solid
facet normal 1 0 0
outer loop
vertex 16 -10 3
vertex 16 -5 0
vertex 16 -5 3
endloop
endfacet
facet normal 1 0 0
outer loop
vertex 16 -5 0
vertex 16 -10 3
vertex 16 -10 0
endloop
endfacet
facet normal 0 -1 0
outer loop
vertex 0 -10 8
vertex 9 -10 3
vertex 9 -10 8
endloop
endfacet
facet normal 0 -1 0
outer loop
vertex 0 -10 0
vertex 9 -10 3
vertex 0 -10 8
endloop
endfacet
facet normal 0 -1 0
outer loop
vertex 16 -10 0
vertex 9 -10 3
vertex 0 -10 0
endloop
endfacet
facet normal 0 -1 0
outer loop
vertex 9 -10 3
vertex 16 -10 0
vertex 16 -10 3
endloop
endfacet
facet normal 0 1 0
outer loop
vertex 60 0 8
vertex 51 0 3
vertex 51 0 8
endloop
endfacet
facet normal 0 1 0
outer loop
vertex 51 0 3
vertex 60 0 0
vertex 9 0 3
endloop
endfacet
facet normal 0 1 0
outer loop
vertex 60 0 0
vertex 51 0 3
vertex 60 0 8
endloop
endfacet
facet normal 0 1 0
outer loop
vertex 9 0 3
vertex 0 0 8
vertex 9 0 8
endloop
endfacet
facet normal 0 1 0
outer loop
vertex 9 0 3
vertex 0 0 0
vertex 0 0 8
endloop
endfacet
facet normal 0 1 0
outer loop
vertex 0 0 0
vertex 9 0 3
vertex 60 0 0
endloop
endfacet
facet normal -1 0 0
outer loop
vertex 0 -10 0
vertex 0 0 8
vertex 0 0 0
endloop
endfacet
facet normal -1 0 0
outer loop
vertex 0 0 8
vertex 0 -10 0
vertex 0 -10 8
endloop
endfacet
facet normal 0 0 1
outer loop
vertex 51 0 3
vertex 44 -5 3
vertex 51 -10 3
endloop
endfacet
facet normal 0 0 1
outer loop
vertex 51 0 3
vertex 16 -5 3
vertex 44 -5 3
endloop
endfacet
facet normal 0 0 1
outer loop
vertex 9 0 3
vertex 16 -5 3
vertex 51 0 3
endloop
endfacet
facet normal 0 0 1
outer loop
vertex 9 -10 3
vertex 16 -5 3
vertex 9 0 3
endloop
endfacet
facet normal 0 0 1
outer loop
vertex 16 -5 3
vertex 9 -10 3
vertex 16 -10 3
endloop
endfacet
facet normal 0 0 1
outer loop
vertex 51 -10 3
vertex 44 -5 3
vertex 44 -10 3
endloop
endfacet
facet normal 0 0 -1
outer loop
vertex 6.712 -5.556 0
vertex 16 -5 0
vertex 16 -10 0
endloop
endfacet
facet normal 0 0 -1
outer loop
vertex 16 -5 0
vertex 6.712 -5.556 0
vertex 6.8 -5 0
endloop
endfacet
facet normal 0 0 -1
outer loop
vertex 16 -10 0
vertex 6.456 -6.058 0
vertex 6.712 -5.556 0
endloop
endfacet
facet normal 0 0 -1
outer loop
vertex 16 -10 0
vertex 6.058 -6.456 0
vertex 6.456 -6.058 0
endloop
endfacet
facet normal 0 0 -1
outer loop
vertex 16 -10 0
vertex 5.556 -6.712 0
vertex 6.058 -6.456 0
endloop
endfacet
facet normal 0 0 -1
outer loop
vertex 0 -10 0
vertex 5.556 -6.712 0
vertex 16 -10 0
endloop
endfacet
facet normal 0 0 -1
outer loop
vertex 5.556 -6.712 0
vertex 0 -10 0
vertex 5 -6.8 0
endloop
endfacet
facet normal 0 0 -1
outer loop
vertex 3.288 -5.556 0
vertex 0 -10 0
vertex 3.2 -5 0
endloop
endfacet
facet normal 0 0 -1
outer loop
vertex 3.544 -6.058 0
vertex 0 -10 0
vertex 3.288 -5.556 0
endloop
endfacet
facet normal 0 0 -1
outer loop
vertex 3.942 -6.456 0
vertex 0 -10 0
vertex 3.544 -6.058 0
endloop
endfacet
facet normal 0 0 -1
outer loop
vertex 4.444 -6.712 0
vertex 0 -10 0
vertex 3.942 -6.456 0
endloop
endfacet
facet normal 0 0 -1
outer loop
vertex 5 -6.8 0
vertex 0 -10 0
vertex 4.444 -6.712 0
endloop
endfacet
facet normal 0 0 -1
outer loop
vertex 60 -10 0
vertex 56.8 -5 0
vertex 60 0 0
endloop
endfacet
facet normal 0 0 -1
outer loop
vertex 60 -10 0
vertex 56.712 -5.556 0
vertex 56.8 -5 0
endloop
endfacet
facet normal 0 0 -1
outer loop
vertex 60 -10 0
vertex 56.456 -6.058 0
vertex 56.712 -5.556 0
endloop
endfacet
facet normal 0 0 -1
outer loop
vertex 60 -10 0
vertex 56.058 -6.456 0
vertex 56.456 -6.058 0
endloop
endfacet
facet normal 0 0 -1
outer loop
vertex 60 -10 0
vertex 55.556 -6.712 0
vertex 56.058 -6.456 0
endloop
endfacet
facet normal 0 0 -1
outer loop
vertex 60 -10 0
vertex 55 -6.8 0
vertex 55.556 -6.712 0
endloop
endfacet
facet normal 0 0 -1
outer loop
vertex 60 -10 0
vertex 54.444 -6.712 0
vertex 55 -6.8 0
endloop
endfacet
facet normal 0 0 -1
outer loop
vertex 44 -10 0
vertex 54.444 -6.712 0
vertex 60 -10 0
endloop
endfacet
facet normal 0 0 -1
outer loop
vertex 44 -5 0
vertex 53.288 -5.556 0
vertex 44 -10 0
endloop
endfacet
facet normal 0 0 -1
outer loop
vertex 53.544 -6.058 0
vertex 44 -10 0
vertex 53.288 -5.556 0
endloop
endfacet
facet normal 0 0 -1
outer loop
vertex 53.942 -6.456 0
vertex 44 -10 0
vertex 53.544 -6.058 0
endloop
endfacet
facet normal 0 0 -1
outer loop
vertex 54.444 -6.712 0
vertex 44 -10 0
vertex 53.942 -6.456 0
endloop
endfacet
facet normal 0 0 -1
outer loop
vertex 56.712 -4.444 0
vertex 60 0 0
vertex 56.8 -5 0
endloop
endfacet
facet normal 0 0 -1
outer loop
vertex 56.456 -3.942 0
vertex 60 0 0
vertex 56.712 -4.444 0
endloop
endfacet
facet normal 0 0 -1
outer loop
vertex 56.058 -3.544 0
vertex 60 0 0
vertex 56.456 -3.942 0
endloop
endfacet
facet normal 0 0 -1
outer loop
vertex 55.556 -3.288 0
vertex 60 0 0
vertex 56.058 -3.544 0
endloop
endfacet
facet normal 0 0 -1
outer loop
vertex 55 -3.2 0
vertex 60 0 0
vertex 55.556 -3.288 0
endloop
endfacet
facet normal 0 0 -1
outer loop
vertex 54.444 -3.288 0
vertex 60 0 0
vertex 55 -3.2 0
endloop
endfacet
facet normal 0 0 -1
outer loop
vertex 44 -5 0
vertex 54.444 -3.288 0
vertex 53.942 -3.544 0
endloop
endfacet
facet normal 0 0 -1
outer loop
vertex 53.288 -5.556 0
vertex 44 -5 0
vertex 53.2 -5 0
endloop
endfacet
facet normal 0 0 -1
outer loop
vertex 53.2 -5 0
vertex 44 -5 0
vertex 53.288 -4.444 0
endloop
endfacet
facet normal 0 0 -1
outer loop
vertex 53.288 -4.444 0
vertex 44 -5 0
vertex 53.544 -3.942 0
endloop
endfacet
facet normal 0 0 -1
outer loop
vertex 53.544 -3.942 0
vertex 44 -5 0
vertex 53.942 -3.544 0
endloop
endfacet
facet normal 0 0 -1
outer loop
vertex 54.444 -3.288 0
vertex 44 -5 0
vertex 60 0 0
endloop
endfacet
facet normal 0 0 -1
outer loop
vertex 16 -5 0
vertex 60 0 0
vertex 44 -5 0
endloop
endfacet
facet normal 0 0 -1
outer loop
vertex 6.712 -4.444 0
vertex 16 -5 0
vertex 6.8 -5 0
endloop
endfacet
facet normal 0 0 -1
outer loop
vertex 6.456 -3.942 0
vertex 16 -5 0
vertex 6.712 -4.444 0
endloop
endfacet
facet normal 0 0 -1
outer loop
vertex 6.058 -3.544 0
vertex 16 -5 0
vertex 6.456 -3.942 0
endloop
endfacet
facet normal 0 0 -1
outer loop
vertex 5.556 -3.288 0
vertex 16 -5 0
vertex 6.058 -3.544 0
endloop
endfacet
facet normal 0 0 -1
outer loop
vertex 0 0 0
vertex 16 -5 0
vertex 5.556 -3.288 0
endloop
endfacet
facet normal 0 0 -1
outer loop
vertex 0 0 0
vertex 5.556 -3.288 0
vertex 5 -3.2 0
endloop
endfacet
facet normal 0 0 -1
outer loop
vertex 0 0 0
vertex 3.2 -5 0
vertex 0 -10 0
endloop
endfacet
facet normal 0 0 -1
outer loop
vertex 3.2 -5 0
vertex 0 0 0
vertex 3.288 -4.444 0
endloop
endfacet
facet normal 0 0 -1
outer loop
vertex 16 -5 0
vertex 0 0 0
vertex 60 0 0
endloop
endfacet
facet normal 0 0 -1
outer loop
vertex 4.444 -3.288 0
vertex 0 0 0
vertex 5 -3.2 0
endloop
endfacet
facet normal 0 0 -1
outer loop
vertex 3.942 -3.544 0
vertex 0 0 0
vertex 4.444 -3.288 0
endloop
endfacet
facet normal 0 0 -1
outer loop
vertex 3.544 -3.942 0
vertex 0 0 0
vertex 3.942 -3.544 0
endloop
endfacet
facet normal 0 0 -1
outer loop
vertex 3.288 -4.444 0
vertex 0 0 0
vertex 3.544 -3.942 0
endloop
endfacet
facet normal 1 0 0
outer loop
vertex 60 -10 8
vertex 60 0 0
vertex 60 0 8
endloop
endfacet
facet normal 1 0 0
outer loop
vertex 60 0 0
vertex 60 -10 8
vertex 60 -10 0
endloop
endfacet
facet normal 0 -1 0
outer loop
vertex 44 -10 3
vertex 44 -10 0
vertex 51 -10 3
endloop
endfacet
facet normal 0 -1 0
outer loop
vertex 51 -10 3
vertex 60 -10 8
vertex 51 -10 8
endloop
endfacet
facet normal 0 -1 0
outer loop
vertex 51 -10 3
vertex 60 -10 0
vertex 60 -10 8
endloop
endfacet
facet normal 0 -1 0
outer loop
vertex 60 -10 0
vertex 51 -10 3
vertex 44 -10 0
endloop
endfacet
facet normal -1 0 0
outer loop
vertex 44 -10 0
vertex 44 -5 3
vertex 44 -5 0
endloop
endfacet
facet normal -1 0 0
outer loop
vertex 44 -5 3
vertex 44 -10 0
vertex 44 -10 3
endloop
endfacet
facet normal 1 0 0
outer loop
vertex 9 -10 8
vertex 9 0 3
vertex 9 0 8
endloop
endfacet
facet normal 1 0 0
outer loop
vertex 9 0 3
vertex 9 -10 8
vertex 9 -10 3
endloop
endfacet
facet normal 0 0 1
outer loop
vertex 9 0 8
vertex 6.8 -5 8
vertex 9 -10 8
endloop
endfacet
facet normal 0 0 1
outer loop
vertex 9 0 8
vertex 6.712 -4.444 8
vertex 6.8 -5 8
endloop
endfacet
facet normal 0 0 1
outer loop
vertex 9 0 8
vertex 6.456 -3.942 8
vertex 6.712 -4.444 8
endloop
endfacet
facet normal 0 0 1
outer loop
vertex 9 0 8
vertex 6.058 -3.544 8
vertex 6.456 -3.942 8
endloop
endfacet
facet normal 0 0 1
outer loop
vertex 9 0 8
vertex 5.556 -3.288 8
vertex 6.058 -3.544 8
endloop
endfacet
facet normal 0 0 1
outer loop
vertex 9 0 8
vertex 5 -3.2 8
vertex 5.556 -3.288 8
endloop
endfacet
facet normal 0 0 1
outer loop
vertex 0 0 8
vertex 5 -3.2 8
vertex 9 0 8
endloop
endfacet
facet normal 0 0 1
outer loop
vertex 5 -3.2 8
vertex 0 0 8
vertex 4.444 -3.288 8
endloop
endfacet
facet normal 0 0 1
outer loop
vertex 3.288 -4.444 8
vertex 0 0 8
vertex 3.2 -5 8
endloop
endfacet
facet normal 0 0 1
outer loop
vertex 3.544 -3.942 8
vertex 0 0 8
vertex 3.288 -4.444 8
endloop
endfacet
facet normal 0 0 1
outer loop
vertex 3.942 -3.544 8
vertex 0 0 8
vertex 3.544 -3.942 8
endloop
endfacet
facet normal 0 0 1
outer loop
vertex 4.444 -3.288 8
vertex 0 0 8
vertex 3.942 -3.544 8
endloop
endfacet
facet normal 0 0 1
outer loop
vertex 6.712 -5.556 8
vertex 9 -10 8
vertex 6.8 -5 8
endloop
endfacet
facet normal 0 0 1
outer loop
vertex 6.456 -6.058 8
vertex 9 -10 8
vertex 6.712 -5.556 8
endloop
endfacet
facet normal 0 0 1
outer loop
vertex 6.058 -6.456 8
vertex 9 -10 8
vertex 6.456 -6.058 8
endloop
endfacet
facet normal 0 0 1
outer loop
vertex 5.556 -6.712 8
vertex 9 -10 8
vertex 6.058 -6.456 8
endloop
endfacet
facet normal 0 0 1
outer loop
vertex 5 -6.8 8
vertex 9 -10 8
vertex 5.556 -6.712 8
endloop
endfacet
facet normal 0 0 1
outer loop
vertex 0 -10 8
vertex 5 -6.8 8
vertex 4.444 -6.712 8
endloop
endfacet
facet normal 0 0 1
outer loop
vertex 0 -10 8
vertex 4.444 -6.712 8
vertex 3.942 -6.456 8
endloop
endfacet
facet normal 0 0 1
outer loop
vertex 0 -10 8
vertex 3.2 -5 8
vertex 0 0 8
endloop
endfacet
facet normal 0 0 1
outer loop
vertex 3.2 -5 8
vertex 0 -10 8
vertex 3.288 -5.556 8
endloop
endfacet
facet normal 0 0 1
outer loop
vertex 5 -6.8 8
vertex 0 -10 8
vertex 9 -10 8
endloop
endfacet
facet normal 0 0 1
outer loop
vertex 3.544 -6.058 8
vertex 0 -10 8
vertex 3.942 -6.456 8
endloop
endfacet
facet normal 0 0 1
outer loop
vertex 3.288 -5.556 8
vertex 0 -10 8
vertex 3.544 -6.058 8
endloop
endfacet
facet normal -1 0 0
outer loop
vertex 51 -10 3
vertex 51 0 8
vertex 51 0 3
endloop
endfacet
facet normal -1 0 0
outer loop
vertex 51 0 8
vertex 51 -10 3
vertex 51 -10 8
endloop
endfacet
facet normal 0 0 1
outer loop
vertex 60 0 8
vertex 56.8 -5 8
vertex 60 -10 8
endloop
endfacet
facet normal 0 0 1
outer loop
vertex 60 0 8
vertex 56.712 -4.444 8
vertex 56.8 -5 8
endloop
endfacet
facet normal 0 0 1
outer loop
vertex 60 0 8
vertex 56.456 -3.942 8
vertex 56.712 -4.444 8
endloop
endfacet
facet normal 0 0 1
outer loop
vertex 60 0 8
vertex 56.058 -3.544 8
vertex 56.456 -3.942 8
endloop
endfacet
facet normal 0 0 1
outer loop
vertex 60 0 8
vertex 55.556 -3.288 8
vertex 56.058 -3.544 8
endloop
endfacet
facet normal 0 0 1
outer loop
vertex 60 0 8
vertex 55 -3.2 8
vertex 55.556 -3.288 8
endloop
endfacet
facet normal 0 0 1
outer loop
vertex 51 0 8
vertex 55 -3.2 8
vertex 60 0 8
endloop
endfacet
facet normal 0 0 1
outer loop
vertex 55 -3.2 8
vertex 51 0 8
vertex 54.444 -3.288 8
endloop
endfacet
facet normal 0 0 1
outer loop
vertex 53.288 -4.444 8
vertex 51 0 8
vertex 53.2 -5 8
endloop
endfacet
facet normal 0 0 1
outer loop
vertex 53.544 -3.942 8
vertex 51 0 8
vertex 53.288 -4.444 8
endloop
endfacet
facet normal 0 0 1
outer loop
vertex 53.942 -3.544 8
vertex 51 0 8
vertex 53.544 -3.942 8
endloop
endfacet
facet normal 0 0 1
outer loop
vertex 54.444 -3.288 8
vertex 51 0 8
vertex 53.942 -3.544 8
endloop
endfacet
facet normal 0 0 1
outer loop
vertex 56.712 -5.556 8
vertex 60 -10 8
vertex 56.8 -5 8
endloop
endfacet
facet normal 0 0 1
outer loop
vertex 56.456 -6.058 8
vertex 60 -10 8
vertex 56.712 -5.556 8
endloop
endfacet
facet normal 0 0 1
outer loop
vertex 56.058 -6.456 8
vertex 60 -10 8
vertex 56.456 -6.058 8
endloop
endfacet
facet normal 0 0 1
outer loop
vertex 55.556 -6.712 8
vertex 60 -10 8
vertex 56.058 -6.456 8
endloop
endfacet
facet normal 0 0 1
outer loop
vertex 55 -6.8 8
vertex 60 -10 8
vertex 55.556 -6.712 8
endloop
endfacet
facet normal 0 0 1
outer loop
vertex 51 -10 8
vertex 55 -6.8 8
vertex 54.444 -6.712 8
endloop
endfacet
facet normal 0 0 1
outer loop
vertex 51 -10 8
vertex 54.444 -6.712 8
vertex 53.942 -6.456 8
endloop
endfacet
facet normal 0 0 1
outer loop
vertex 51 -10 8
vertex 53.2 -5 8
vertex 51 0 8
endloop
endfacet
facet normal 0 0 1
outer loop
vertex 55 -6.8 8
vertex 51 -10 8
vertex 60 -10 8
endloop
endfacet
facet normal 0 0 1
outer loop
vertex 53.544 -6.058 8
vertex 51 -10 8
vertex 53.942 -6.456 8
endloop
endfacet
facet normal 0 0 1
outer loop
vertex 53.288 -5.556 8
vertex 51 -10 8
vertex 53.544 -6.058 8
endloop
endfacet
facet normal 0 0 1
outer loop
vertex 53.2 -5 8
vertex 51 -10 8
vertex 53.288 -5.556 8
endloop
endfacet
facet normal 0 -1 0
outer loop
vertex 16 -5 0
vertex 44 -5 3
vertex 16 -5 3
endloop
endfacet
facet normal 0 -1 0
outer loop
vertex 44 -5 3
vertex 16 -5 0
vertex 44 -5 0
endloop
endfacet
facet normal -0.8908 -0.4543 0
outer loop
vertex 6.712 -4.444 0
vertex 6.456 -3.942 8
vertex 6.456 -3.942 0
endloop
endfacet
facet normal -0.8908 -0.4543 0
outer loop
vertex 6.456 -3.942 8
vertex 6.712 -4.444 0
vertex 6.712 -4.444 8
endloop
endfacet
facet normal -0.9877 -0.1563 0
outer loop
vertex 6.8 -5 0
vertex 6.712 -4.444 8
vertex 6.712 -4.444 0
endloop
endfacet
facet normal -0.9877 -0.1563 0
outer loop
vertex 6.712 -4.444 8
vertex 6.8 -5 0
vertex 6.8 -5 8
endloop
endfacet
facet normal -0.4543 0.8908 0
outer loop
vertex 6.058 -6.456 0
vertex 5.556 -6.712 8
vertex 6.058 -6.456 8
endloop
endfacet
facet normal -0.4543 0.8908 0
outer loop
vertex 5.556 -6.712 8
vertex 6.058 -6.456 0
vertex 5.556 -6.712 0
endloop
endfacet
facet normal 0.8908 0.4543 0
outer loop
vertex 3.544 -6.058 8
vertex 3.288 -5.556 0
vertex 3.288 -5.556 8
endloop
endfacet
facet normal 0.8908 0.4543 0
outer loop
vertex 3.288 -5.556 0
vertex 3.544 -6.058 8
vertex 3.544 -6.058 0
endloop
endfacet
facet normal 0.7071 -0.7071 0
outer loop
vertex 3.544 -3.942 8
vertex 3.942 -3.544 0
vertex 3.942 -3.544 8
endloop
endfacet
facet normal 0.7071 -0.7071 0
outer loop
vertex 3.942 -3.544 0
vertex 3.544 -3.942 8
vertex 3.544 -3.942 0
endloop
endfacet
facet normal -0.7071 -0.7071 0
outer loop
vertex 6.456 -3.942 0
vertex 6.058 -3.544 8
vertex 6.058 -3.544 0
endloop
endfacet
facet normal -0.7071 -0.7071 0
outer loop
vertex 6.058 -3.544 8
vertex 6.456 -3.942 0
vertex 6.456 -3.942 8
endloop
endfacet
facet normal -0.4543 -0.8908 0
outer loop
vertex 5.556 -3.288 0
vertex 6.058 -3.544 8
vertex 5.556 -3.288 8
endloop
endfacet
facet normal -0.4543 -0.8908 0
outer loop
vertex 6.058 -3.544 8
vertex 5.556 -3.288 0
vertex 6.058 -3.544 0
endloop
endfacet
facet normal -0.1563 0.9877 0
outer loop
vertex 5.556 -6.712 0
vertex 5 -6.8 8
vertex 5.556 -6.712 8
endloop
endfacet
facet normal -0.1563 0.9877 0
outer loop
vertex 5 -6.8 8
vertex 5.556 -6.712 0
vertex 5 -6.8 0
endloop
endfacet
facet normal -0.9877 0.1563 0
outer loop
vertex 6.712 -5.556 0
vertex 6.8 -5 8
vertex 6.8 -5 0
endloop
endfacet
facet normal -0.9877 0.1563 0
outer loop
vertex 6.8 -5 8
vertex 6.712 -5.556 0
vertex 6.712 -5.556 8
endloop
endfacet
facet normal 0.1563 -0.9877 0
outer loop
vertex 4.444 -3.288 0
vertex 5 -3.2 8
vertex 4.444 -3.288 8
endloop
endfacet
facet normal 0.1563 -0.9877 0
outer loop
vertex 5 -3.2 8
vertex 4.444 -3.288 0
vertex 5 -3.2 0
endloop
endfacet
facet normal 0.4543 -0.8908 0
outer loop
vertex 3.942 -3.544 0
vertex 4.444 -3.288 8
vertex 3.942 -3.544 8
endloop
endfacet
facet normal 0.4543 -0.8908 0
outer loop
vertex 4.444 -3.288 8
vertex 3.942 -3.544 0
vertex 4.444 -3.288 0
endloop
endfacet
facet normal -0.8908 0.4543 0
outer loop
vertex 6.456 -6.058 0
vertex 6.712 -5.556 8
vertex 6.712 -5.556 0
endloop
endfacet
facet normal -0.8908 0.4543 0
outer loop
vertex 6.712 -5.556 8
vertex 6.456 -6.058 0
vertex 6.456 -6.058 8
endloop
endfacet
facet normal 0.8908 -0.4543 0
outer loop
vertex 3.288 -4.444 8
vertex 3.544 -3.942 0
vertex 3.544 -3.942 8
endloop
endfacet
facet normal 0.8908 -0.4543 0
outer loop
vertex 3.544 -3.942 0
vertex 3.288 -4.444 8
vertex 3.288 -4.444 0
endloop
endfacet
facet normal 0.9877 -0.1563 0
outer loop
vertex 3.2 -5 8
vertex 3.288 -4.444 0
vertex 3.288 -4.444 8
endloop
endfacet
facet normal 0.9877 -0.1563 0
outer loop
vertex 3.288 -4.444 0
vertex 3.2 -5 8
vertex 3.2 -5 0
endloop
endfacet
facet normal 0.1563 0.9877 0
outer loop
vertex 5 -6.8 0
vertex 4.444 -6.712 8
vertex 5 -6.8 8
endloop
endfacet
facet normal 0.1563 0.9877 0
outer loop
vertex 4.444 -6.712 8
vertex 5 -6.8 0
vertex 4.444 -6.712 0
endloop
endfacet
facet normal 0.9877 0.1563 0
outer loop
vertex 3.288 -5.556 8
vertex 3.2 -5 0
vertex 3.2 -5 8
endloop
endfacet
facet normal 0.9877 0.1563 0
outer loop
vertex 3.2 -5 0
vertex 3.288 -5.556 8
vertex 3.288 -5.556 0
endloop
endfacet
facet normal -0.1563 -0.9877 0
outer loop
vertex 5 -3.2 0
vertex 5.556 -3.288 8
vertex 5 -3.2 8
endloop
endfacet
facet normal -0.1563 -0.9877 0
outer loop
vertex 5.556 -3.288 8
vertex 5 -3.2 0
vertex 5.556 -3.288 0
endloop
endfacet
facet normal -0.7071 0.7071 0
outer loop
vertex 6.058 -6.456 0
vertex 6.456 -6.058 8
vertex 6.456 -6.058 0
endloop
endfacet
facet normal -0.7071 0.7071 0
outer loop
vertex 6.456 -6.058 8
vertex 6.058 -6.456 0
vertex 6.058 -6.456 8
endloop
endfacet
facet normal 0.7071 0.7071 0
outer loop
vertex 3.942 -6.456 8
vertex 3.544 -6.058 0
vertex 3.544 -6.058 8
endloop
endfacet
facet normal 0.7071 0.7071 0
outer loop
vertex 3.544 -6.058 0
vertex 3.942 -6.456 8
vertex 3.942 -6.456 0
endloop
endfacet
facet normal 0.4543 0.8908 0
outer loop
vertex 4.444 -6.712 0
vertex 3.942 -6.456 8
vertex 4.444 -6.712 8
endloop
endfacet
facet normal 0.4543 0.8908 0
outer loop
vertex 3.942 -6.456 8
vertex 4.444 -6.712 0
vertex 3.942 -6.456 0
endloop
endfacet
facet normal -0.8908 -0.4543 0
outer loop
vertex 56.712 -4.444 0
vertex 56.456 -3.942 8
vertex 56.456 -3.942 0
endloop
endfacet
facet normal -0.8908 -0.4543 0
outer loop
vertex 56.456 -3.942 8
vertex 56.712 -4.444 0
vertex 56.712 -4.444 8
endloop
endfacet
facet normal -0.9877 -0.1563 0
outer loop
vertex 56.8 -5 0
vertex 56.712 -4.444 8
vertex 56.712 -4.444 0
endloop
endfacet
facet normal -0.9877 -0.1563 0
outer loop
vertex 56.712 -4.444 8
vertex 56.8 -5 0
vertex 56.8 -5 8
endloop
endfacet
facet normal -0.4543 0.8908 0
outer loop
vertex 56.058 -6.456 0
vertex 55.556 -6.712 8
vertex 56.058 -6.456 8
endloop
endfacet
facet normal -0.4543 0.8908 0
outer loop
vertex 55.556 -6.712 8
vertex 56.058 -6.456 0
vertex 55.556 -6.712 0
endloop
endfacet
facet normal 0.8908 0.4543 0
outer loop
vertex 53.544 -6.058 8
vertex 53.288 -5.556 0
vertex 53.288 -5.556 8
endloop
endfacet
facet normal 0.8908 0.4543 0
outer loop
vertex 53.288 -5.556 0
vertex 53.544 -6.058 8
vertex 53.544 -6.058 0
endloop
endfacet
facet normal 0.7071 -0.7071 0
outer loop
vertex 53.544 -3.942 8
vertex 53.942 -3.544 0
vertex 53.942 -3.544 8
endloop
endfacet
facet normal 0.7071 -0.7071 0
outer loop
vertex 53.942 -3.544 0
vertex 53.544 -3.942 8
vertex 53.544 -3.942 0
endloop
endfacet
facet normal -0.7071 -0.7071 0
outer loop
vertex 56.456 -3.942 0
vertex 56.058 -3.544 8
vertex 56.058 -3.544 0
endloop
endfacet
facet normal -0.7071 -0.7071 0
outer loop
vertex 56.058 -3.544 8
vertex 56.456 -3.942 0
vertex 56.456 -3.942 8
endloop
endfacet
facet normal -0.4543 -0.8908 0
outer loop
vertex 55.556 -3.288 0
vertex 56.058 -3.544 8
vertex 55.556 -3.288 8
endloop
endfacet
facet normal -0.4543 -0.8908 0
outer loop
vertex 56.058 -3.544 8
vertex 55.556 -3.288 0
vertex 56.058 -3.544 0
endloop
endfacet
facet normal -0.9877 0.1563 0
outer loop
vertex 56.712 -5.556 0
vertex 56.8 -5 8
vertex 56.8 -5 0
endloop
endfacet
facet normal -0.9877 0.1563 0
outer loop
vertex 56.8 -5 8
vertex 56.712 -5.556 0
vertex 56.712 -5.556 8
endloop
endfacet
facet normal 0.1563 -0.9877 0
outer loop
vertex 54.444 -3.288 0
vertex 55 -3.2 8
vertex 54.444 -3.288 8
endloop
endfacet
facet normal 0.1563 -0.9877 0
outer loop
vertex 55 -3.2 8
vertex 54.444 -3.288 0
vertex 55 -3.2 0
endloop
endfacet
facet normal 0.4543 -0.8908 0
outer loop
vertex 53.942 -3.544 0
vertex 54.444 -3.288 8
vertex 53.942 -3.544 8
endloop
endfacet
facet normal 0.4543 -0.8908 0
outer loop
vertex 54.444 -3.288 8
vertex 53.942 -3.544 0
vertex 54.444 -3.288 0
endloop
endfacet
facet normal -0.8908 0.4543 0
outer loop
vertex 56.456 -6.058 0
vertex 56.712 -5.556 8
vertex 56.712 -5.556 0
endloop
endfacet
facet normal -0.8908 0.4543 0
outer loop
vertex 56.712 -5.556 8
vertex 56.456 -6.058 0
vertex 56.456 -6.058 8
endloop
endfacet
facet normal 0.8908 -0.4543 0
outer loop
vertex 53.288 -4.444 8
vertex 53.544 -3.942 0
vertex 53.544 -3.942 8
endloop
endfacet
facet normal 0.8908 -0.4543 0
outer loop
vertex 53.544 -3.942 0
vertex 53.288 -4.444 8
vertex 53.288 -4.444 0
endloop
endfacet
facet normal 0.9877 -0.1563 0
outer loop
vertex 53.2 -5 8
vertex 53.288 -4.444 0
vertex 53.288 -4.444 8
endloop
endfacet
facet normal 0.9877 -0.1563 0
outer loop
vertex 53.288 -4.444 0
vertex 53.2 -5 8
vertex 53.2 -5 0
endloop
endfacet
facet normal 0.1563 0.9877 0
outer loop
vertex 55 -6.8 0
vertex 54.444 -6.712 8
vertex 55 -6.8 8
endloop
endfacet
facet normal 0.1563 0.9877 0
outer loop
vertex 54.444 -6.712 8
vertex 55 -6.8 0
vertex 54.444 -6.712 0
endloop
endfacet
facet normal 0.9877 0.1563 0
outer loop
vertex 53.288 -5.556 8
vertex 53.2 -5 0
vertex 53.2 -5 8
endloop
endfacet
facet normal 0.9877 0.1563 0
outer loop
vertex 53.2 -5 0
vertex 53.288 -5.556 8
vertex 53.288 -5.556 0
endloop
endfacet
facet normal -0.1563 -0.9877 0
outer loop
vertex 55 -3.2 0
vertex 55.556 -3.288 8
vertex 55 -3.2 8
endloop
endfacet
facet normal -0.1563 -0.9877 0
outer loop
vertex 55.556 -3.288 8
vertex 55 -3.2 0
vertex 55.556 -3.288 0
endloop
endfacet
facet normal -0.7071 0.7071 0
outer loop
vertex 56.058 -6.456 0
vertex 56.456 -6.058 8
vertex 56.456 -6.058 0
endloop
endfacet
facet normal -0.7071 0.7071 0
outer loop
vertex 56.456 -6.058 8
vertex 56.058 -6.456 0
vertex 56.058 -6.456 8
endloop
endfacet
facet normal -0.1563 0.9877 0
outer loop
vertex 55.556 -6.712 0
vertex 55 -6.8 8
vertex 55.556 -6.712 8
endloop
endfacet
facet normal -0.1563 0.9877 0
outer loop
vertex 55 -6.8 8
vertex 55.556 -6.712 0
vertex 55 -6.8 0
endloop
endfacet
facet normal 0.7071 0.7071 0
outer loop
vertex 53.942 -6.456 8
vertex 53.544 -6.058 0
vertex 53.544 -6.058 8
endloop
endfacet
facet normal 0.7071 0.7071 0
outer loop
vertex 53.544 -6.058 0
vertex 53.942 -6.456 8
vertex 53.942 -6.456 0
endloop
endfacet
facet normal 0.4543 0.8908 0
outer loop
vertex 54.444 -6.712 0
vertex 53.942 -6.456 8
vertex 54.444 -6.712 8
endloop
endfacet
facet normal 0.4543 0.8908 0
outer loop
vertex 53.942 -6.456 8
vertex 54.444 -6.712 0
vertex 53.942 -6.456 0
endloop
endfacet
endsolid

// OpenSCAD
screw_r=1.8;

rotate([90,0,0])
translate([-28,0,0])
difference()
{

    union()
    {
        translate([37,0,0])
            cube([42,3,5]);


        translate([28,0,0])
        {
            cube([16,3,10]);

            translate([44,0,0])
                cube([16,3,10]);
        }

        translate([28,0,0])
        {
            cube([9,8,10]);

            translate([51,0,0])
                cube([9,8,10]);
        }
    }
    
    translate([33,-1,5])
        rotate([-90,0,0])
            cylinder(r=screw_r,h=22,$fn=20);

    translate([83,-1,5])
        rotate([-90,0,0])
            cylinder(r=screw_r,h=22,$fn=20);
}


    
    
    
